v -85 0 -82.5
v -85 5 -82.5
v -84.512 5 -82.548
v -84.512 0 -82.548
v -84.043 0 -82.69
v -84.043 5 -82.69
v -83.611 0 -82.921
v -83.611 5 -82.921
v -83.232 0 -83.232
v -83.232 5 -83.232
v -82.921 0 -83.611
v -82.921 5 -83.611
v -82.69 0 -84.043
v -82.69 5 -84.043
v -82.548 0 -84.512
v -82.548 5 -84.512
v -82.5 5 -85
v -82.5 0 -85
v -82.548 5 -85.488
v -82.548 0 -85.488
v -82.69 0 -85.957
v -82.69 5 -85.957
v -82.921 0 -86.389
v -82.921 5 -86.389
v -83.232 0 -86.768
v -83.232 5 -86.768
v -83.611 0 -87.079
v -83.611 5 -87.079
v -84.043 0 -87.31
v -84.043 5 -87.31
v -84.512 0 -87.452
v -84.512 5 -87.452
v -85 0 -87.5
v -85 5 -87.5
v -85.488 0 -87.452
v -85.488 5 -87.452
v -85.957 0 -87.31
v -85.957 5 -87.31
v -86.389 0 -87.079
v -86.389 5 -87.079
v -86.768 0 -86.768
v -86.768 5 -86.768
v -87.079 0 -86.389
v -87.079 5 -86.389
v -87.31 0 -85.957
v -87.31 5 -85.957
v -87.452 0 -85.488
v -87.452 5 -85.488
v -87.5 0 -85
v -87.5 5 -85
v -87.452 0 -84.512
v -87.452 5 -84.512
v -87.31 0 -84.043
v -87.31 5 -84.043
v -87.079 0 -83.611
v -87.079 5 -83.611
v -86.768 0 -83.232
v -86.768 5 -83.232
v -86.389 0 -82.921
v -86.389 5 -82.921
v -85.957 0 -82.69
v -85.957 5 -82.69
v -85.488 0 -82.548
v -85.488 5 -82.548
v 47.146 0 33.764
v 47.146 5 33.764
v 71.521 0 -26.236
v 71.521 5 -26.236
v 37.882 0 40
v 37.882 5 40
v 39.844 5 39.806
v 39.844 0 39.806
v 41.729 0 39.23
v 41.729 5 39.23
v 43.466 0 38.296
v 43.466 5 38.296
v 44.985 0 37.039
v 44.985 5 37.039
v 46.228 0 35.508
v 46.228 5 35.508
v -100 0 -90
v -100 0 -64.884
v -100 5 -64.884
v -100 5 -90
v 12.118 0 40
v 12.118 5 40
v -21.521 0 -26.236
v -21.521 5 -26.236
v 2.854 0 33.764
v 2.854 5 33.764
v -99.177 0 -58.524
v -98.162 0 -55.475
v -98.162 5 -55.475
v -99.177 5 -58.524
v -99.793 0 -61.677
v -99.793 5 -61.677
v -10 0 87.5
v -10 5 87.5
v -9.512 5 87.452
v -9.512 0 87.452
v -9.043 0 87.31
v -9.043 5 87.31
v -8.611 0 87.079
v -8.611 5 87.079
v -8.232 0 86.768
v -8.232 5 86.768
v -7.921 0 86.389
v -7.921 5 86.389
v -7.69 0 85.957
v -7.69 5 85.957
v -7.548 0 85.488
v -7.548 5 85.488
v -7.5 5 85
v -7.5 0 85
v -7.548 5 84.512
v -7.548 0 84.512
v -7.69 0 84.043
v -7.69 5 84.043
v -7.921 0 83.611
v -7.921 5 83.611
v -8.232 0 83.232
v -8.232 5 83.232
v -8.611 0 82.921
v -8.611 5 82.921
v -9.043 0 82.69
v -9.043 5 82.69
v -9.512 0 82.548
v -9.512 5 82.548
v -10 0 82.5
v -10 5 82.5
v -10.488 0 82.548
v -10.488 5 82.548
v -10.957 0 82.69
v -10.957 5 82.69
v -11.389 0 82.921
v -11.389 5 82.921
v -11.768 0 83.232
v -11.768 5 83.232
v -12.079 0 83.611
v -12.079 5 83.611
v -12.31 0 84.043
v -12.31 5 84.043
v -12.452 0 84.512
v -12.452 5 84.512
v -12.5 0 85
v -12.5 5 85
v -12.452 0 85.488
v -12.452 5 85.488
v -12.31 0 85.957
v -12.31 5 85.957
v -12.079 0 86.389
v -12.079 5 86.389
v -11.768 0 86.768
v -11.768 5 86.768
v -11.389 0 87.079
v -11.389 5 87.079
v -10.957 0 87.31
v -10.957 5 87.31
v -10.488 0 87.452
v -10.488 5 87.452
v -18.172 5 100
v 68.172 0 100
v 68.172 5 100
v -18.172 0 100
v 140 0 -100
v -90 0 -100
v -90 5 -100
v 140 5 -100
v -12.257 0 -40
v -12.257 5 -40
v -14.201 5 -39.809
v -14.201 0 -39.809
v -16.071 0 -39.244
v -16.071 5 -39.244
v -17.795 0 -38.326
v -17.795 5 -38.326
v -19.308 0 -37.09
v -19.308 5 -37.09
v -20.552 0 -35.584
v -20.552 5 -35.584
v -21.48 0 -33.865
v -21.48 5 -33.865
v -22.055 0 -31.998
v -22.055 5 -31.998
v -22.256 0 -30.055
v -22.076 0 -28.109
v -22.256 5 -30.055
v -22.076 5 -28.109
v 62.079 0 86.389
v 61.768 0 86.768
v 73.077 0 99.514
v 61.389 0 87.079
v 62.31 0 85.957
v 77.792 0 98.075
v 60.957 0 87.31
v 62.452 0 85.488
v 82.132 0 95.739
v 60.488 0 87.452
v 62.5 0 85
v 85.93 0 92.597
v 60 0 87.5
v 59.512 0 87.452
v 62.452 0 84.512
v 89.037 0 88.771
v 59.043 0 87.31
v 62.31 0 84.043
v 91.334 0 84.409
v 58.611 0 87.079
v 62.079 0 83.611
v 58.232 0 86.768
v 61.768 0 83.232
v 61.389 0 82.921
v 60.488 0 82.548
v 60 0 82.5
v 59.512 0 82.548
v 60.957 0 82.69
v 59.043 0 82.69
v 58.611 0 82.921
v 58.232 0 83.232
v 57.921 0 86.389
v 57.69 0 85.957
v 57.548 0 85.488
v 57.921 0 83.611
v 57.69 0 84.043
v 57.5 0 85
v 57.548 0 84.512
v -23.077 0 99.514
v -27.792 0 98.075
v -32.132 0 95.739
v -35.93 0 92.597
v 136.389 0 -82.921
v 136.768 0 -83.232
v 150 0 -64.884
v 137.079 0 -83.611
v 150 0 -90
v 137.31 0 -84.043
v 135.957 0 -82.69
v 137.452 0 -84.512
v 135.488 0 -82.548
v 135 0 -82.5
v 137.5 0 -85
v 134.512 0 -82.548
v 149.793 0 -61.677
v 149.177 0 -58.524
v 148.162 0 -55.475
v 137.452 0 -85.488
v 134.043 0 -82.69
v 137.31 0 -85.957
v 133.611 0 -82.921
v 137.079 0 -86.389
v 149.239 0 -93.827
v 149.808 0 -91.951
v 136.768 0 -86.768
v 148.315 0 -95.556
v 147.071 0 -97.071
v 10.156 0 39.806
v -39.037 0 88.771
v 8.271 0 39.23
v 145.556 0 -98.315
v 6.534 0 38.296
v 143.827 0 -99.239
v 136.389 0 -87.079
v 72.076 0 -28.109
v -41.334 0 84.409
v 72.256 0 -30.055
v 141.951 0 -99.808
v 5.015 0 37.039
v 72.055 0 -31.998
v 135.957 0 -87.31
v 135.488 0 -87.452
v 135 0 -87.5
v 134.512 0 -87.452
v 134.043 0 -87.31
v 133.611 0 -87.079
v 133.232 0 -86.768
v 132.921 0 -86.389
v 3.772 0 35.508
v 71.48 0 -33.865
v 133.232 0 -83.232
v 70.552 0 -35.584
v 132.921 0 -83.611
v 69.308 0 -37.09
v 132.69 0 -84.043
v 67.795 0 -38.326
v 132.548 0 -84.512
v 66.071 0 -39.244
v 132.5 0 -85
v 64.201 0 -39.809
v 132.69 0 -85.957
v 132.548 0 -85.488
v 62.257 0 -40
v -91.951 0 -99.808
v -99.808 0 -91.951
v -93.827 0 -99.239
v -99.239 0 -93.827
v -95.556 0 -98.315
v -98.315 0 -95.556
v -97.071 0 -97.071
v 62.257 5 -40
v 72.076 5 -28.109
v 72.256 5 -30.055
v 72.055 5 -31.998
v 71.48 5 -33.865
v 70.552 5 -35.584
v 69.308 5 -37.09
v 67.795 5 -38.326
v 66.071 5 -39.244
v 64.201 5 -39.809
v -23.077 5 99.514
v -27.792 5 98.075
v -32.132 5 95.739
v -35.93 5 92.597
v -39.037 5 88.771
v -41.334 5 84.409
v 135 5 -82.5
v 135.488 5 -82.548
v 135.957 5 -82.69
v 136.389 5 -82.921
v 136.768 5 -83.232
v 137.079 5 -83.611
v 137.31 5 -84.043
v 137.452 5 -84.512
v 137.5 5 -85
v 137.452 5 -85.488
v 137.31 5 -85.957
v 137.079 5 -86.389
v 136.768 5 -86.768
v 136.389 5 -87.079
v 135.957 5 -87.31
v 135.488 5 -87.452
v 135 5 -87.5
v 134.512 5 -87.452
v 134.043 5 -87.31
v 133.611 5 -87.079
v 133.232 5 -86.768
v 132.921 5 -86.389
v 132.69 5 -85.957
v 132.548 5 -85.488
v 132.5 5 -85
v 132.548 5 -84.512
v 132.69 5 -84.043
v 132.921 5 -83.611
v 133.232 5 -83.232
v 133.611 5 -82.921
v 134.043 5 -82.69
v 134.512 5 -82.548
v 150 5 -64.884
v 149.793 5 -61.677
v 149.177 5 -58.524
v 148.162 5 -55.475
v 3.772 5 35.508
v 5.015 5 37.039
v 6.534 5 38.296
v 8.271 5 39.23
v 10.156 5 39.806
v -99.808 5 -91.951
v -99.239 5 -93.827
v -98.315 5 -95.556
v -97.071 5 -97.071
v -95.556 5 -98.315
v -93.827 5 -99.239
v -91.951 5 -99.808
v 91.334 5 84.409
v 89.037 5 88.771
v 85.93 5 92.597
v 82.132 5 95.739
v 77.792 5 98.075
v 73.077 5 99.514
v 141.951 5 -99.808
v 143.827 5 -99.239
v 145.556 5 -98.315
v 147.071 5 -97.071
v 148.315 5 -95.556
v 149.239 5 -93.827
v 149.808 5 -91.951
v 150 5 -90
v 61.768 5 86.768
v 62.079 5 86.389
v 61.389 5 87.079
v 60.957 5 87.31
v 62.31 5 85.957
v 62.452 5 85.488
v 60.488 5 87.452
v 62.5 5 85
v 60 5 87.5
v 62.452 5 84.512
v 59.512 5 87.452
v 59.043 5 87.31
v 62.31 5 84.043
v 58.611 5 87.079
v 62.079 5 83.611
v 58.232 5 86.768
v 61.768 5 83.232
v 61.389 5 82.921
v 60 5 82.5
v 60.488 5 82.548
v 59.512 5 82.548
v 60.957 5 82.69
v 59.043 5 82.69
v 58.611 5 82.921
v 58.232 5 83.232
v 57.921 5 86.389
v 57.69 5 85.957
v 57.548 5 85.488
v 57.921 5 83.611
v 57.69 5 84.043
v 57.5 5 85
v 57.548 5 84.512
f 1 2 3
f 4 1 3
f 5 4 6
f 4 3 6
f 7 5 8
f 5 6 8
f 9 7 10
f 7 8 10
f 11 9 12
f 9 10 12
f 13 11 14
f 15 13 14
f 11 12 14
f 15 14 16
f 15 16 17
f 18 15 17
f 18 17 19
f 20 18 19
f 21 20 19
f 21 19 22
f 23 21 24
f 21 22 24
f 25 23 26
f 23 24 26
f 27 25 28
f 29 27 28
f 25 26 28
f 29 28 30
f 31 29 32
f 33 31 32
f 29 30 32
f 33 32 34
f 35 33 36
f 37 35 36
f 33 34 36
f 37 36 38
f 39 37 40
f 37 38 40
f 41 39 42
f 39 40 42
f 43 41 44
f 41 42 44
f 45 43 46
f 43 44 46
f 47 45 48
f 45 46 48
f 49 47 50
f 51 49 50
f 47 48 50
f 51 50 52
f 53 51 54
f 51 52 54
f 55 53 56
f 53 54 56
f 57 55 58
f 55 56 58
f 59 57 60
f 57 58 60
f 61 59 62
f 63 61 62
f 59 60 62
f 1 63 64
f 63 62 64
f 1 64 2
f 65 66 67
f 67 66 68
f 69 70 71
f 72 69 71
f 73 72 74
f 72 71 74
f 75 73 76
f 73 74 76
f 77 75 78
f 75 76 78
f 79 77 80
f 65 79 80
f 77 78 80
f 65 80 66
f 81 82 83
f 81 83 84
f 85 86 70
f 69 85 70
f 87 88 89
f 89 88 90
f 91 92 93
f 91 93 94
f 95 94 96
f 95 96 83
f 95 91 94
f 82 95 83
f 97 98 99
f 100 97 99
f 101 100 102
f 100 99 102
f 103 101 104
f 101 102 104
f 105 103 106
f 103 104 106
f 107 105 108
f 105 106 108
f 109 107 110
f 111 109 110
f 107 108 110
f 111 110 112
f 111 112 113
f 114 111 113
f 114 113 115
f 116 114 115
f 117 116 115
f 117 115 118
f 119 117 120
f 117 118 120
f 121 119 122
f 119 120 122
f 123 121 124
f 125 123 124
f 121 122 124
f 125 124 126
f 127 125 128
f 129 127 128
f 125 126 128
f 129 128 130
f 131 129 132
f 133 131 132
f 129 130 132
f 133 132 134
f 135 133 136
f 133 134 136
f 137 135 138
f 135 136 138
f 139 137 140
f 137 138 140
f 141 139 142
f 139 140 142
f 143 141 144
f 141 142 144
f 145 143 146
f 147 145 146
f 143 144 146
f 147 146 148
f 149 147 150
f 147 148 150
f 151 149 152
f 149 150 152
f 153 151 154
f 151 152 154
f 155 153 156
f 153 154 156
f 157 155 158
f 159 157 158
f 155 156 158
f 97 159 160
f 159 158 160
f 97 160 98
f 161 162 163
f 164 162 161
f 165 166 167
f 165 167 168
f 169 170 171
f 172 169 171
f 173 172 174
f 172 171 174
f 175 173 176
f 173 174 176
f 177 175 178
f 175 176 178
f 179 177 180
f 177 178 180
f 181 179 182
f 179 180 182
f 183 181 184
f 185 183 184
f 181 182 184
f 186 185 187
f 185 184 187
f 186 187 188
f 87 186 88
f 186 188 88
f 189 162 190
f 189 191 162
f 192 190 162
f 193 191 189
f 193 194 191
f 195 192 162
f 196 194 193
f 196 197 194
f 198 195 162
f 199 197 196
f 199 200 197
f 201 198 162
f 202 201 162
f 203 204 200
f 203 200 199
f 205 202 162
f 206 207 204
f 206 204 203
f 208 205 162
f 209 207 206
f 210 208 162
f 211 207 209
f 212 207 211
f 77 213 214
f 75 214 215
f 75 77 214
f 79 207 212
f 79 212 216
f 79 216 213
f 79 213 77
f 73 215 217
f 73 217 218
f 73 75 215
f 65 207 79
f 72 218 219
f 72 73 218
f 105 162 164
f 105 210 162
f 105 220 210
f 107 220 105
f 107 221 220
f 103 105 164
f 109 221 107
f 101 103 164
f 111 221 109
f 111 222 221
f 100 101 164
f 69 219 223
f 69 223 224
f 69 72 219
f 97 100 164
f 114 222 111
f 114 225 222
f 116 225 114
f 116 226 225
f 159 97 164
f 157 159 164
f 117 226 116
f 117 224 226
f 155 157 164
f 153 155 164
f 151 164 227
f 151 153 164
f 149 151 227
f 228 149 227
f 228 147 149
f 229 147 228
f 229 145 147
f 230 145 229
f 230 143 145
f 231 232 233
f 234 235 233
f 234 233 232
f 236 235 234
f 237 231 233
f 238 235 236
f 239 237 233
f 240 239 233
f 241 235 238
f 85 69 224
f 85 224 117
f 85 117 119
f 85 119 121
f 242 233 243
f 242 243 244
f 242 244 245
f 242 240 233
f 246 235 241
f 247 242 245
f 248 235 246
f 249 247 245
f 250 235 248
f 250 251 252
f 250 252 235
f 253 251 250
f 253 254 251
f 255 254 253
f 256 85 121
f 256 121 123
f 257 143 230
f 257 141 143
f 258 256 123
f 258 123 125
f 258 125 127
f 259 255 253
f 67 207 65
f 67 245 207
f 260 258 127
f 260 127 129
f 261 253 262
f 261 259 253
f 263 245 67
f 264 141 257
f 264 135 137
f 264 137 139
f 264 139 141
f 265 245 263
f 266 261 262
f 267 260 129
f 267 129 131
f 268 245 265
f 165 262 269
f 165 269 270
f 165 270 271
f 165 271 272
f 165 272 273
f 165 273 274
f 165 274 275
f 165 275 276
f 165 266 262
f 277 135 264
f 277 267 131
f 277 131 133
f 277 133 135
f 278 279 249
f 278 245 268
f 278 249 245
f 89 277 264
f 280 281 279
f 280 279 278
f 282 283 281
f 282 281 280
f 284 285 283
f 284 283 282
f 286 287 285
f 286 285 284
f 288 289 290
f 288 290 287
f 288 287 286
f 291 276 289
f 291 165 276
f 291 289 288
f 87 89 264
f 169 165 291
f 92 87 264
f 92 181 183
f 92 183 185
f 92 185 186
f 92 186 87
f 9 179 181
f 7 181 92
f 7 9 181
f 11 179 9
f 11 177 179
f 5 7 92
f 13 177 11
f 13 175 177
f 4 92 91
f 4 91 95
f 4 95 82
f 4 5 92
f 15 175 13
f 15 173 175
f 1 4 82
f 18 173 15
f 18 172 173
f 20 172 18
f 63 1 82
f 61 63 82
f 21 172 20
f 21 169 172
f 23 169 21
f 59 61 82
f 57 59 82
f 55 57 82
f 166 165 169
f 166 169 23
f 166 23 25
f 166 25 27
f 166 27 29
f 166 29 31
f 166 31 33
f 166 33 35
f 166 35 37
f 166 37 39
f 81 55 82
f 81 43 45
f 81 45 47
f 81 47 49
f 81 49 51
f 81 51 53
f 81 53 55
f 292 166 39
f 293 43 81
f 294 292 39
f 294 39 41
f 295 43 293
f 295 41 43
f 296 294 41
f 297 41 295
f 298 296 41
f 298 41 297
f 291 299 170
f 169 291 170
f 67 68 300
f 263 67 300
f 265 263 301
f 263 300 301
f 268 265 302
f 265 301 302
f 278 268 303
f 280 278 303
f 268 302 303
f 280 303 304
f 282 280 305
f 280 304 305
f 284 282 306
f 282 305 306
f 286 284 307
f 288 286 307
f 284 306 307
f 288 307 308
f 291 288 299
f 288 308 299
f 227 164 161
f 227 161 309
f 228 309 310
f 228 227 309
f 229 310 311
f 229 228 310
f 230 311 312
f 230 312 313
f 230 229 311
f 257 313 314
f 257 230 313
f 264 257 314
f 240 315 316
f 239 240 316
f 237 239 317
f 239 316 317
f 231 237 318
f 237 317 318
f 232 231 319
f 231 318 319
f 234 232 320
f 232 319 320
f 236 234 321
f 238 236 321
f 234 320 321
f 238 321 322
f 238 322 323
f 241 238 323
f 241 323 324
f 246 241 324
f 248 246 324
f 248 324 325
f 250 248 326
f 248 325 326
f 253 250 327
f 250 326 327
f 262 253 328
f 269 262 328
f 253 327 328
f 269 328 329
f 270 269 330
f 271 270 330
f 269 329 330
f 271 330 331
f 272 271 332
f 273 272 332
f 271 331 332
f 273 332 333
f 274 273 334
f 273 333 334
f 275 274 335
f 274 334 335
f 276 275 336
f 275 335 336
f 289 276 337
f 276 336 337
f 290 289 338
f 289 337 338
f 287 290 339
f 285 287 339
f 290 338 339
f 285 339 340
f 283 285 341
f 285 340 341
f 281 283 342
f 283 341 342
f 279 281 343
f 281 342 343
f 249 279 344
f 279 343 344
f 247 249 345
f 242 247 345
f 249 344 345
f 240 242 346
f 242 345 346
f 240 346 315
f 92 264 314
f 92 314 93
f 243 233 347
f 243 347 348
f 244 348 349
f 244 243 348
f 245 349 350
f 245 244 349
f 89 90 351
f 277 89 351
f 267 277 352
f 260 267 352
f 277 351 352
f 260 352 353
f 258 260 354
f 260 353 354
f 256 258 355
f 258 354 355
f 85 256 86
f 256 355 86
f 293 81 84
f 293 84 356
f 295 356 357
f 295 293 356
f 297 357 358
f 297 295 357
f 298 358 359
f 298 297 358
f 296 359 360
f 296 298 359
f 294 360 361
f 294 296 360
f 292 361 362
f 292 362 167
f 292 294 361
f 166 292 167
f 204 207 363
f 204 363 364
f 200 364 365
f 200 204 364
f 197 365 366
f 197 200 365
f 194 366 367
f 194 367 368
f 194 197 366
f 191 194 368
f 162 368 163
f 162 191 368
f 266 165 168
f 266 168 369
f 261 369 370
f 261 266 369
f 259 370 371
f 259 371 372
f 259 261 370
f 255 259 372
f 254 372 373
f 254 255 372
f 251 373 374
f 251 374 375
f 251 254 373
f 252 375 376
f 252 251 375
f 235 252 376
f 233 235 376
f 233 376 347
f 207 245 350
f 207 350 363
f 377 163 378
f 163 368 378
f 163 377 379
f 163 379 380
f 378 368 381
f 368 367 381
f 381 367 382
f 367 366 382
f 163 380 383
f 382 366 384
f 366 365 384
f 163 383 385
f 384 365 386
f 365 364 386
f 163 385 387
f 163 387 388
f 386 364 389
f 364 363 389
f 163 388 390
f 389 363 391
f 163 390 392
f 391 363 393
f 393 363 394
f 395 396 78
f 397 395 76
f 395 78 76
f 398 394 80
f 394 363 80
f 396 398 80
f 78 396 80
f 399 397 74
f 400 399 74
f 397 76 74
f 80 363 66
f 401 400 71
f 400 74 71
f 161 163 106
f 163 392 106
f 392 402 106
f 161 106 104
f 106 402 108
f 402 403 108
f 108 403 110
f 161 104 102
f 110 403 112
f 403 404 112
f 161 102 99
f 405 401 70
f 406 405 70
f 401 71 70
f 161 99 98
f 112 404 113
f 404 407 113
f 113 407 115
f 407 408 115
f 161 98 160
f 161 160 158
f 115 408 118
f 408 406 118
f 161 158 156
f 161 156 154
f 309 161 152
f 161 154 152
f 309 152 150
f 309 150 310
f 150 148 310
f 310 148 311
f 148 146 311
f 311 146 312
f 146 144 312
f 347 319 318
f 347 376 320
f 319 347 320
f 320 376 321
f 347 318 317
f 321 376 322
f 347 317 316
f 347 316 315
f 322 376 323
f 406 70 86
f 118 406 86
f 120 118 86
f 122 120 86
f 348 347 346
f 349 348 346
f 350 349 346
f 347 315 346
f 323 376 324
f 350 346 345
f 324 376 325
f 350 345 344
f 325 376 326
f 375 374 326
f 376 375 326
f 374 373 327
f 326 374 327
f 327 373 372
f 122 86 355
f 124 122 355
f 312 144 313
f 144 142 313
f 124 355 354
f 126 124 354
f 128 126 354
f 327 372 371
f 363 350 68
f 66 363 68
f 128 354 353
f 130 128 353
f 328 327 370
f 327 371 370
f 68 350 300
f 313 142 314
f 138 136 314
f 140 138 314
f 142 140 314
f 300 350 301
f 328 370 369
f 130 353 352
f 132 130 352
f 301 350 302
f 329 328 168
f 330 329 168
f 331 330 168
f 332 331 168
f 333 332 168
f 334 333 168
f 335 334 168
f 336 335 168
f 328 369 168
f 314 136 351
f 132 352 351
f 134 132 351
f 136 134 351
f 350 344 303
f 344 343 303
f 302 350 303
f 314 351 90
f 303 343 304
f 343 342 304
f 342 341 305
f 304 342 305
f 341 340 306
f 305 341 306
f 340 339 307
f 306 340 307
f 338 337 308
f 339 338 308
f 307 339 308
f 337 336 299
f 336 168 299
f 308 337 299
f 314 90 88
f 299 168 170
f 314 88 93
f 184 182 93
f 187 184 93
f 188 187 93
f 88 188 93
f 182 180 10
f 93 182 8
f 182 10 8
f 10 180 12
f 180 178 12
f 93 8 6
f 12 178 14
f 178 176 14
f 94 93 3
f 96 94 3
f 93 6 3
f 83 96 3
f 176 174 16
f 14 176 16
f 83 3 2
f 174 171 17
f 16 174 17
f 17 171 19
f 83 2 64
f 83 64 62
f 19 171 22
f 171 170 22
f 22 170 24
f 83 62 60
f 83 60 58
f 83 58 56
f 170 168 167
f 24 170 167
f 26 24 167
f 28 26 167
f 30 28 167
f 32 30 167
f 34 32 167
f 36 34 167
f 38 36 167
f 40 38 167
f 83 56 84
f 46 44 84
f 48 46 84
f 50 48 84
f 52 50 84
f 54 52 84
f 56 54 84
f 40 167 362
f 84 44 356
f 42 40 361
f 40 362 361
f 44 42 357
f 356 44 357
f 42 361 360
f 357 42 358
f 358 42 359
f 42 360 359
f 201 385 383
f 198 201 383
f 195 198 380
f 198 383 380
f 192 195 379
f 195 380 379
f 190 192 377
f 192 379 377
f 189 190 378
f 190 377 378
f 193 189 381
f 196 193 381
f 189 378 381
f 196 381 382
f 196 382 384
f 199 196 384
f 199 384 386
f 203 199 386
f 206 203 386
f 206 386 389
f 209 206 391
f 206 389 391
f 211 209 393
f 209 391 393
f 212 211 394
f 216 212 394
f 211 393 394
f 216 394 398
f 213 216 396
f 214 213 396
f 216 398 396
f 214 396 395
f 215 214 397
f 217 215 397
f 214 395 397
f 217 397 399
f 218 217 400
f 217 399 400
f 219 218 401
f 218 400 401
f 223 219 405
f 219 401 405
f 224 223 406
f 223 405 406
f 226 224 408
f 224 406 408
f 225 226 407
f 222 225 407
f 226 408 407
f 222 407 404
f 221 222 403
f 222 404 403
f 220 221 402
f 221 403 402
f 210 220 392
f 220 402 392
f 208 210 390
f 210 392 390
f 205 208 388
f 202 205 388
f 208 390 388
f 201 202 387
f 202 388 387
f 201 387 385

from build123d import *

# Parameters (mm, degrees)
RESSALTO_EXTRUS_O1_DEPTH = 5
ESBO_O2_R                = 2.5
CORTE_EXTRUS_O1_DEPTH    = 5
CORTE_EXTRUS_O2_DEPTH    = 10


with BuildPart() as part:
    # Esboço1 → Ressalto-extrusão1 (new body)
    with BuildSketch(Plane(origin=(0, 0, 0), x_dir=(1, 0, 0), z_dir=(0, 1, 0))):
        with BuildLine():
            Line((68.172006189, -100), (-18.172006189, -100))
            ThreePointArc((-18.172006189, -100), (-32.132026705, -95.739282224), (-41.333670617, -84.409426174))
            Line((-41.333670617, -84.409426174), (-98.161664428, 55.474866284))
            ThreePointArc((-98.161664428, 55.474866284), (-99.536112271, 60.090630534), (-100, 64.884292458))
            Line((-100, 64.884292458), (-100, 90))
            ThreePointArc((-100, 90), (-97.071067812, 97.071067812), (-90, 100))
            Line((-90, 100), (140, 100))
            ThreePointArc((140, 100), (147.071067812, 97.071067812), (150, 90))
            Line((150, 90), (150, 64.884292458))
            ThreePointArc((150, 64.884292458), (149.536112271, 60.090630534), (148.161664428, 55.474866284))
            Line((148.161664428, 55.474866284), (91.333670617, -84.409426174))
            ThreePointArc((91.333670617, -84.409426174), (82.132026705, -95.739282224), (68.172006189, -100))
        make_face()
    extrude(amount=RESSALTO_EXTRUS_O1_DEPTH)

    # Esboço2 → Corte-extrusão1 (cut)
    with BuildSketch(Plane(origin=(0, 5, 0), x_dir=(1, 0, 0), z_dir=(0, 1, 0))):
        with Locations(Location((-85, 85, 0), (0, 0, 270))):
            Circle(ESBO_O2_R)
        with Locations(Location((-10, -85, 0), (0, 0, 270))):
            Circle(ESBO_O2_R)
        with Locations(Location((60, -85, 0), (0, 0, 270))):
            Circle(ESBO_O2_R)
        with Locations(Location((135, 85, 0), (0, 0, 270))):
            Circle(ESBO_O2_R)
    extrude(amount=-CORTE_EXTRUS_O1_DEPTH, mode=Mode.SUBTRACT)

    # Esboço3 → Corte-extrusão2 (cut)
    with BuildSketch(Plane(origin=(0, 5, 0), x_dir=(1, 0, 0), z_dir=(0, 1, 0))):
        with BuildLine():
            Line((-21.5212831, 26.23622953), (2.8537169, -33.76377047))
            ThreePointArc((2.8537169, -33.76377047), (6.534374465, -38.29571289), (12.118382671, -40))
            Line((12.118382671, -40), (37.881617329, -40))
            ThreePointArc((37.881617329, -40), (43.465625535, -38.29571289), (47.1462831, -33.76377047))
            Line((47.1462831, -33.76377047), (71.5212831, 26.23622953))
            ThreePointArc((71.5212831, 26.23622953), (70.552330218, 35.584008207), (62.256617329, 40))
            Line((62.256617329, 40), (-12.256617329, 40))
            ThreePointArc((-12.256617329, 40), (-20.552330218, 35.584008207), (-21.5212831, 26.23622953))
        make_face()
    extrude(amount=-CORTE_EXTRUS_O2_DEPTH, mode=Mode.SUBTRACT)


solid = part.part
